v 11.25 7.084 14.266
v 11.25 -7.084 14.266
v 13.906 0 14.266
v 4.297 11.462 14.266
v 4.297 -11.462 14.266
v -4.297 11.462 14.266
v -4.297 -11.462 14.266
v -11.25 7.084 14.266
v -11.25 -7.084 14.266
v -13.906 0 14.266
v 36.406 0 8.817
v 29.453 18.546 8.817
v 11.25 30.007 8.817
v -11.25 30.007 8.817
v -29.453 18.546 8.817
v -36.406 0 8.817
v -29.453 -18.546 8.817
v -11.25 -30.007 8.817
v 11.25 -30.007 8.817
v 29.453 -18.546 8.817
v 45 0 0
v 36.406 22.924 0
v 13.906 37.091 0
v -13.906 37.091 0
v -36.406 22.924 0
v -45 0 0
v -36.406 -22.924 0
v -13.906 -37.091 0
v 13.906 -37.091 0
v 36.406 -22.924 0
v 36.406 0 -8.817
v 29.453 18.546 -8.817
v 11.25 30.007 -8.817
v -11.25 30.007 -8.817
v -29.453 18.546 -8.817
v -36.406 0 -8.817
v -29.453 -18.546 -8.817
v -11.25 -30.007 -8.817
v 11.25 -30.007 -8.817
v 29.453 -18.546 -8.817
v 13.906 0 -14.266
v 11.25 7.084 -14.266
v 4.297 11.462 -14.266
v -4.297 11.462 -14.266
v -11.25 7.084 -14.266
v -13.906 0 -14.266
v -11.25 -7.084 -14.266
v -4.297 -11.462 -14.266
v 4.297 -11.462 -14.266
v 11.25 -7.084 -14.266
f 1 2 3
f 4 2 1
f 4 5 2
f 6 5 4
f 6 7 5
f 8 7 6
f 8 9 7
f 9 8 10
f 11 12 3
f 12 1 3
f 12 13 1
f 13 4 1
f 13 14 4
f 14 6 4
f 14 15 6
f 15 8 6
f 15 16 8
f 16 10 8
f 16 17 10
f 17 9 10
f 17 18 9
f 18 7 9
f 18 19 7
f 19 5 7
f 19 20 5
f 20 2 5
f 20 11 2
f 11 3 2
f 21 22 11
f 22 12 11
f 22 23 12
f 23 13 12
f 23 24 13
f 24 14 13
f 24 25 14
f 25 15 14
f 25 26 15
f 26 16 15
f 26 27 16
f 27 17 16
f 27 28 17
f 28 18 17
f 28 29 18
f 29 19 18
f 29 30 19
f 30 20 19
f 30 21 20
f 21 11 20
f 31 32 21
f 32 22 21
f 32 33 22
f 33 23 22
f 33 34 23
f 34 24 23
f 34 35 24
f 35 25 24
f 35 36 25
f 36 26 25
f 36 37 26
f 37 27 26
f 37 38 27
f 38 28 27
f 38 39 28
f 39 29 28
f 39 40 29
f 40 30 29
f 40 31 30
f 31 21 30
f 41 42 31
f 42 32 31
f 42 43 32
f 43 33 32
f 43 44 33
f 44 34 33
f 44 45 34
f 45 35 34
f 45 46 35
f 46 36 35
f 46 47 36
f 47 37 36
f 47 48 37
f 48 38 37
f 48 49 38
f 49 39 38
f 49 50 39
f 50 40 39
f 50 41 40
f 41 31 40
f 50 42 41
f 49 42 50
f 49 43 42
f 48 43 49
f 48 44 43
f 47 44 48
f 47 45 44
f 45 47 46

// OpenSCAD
// Generated by SolidPython 1.0.1 on 2020-07-29 00:46:52


scale(v = [15, 13, 5]) {
	sphere(r = 3);
}
/***********************************************
*********      SolidPython code:      **********
************************************************
 
# import packages: SolidPython
from solid import *
from solid.utils import *
from itertools import chain, combinations, permutations


class Resize:

    def __init__(self, scad_file):
        self.scad_file = scad_file
        #self.scad_file = import_scad(scad_file)
        # cone/cylinder param:
        self.r1 = 0
        self.r2 = 0
        self.h = 0
        # rectangular prism param:
        self.w = 0
        self.l = 0
        # ellipse param:
        self.r = 0

    # import OpenScad code (file name corresponds to shape)


    # classify shape + parameters
    def assign(self, param1, param2, param3):
        if self.scad_file == 'cone.scad':
            self.r1 = param1
            self.r2 = param2
            self.h = param3
        elif self.scad_file == 'cylinder.scad':
            self.r1 = param1
            self.r2 = param2
            self.h = param3
        elif self.scad_file == 'rectangularPrism.scad':
            self.h = param1
            self.l = param2
            self.w = param3
        else:
            self.r = param1
            self.h = param2

    # resize parameters
    def iterate(self):
        x = range(3, 20, 2)
        i = 1
        if self.scad_file == 'cone.scad':
            tempList = list(permutations(x, 2))
            for temp in tempList:
                param1 = temp[0]
                param2 = temp[1]
                filepath = 'produced_scad_files/' + 'cone' + str(param1) + '_' + str(param2) + '_' + '.scad'
                scad_render_to_file(cylinder(h=param1, r1=param2, r2=0), filepath)

        elif self.scad_file == 'cylinder.scad':
            tempList = list(permutations(x, 3))
            for temp in tempList:
                param1 = temp[0]
                param2 = temp[1]
                filepath = 'produced_scad_files/' + 'cylinder' + str(param1) + '_' + str(param2) + '_' + '.scad'
                scad_render_to_file(cylinder(h=param1, r1=param2, r2=param2), filepath)

        elif self.scad_file == 'rectangularPrism.scad':
            tempList = list(permutations(x, 3))
            for temp in tempList:
                param1 = temp[0]
                param2 = temp[1]
                param3 = temp[2]
                filepath = 'produced_scad_files/' + 'rectangularPrism' + str(param1) + '_' + str(param2) + '_' + str(
                    param3) + '.scad'
                scad_render_to_file(cube(size=(param1, param2, param3)), filepath)

        elif self.scad_file == 'ellipse.scad':
            tempList = list(permutations(x, 4))
            for temp in tempList:
                param1 = temp[0]
                param2 = temp[1]
                param3 = temp[2]
                param4 = temp[3]
                filepath = 'produced_scad_files/' + 'ellipse' + str(param1) + '_' + str(param2) + '_' + str(param3) + '_' + str(param4) + '.scad'
                scad_render_to_file(scale([param1, param2, param3])(sphere(r=param4)), filepath)

    def render_to_scadfile(self):
        scad_render_to_file(scad, 'example.scad') 
 
************************************************/
